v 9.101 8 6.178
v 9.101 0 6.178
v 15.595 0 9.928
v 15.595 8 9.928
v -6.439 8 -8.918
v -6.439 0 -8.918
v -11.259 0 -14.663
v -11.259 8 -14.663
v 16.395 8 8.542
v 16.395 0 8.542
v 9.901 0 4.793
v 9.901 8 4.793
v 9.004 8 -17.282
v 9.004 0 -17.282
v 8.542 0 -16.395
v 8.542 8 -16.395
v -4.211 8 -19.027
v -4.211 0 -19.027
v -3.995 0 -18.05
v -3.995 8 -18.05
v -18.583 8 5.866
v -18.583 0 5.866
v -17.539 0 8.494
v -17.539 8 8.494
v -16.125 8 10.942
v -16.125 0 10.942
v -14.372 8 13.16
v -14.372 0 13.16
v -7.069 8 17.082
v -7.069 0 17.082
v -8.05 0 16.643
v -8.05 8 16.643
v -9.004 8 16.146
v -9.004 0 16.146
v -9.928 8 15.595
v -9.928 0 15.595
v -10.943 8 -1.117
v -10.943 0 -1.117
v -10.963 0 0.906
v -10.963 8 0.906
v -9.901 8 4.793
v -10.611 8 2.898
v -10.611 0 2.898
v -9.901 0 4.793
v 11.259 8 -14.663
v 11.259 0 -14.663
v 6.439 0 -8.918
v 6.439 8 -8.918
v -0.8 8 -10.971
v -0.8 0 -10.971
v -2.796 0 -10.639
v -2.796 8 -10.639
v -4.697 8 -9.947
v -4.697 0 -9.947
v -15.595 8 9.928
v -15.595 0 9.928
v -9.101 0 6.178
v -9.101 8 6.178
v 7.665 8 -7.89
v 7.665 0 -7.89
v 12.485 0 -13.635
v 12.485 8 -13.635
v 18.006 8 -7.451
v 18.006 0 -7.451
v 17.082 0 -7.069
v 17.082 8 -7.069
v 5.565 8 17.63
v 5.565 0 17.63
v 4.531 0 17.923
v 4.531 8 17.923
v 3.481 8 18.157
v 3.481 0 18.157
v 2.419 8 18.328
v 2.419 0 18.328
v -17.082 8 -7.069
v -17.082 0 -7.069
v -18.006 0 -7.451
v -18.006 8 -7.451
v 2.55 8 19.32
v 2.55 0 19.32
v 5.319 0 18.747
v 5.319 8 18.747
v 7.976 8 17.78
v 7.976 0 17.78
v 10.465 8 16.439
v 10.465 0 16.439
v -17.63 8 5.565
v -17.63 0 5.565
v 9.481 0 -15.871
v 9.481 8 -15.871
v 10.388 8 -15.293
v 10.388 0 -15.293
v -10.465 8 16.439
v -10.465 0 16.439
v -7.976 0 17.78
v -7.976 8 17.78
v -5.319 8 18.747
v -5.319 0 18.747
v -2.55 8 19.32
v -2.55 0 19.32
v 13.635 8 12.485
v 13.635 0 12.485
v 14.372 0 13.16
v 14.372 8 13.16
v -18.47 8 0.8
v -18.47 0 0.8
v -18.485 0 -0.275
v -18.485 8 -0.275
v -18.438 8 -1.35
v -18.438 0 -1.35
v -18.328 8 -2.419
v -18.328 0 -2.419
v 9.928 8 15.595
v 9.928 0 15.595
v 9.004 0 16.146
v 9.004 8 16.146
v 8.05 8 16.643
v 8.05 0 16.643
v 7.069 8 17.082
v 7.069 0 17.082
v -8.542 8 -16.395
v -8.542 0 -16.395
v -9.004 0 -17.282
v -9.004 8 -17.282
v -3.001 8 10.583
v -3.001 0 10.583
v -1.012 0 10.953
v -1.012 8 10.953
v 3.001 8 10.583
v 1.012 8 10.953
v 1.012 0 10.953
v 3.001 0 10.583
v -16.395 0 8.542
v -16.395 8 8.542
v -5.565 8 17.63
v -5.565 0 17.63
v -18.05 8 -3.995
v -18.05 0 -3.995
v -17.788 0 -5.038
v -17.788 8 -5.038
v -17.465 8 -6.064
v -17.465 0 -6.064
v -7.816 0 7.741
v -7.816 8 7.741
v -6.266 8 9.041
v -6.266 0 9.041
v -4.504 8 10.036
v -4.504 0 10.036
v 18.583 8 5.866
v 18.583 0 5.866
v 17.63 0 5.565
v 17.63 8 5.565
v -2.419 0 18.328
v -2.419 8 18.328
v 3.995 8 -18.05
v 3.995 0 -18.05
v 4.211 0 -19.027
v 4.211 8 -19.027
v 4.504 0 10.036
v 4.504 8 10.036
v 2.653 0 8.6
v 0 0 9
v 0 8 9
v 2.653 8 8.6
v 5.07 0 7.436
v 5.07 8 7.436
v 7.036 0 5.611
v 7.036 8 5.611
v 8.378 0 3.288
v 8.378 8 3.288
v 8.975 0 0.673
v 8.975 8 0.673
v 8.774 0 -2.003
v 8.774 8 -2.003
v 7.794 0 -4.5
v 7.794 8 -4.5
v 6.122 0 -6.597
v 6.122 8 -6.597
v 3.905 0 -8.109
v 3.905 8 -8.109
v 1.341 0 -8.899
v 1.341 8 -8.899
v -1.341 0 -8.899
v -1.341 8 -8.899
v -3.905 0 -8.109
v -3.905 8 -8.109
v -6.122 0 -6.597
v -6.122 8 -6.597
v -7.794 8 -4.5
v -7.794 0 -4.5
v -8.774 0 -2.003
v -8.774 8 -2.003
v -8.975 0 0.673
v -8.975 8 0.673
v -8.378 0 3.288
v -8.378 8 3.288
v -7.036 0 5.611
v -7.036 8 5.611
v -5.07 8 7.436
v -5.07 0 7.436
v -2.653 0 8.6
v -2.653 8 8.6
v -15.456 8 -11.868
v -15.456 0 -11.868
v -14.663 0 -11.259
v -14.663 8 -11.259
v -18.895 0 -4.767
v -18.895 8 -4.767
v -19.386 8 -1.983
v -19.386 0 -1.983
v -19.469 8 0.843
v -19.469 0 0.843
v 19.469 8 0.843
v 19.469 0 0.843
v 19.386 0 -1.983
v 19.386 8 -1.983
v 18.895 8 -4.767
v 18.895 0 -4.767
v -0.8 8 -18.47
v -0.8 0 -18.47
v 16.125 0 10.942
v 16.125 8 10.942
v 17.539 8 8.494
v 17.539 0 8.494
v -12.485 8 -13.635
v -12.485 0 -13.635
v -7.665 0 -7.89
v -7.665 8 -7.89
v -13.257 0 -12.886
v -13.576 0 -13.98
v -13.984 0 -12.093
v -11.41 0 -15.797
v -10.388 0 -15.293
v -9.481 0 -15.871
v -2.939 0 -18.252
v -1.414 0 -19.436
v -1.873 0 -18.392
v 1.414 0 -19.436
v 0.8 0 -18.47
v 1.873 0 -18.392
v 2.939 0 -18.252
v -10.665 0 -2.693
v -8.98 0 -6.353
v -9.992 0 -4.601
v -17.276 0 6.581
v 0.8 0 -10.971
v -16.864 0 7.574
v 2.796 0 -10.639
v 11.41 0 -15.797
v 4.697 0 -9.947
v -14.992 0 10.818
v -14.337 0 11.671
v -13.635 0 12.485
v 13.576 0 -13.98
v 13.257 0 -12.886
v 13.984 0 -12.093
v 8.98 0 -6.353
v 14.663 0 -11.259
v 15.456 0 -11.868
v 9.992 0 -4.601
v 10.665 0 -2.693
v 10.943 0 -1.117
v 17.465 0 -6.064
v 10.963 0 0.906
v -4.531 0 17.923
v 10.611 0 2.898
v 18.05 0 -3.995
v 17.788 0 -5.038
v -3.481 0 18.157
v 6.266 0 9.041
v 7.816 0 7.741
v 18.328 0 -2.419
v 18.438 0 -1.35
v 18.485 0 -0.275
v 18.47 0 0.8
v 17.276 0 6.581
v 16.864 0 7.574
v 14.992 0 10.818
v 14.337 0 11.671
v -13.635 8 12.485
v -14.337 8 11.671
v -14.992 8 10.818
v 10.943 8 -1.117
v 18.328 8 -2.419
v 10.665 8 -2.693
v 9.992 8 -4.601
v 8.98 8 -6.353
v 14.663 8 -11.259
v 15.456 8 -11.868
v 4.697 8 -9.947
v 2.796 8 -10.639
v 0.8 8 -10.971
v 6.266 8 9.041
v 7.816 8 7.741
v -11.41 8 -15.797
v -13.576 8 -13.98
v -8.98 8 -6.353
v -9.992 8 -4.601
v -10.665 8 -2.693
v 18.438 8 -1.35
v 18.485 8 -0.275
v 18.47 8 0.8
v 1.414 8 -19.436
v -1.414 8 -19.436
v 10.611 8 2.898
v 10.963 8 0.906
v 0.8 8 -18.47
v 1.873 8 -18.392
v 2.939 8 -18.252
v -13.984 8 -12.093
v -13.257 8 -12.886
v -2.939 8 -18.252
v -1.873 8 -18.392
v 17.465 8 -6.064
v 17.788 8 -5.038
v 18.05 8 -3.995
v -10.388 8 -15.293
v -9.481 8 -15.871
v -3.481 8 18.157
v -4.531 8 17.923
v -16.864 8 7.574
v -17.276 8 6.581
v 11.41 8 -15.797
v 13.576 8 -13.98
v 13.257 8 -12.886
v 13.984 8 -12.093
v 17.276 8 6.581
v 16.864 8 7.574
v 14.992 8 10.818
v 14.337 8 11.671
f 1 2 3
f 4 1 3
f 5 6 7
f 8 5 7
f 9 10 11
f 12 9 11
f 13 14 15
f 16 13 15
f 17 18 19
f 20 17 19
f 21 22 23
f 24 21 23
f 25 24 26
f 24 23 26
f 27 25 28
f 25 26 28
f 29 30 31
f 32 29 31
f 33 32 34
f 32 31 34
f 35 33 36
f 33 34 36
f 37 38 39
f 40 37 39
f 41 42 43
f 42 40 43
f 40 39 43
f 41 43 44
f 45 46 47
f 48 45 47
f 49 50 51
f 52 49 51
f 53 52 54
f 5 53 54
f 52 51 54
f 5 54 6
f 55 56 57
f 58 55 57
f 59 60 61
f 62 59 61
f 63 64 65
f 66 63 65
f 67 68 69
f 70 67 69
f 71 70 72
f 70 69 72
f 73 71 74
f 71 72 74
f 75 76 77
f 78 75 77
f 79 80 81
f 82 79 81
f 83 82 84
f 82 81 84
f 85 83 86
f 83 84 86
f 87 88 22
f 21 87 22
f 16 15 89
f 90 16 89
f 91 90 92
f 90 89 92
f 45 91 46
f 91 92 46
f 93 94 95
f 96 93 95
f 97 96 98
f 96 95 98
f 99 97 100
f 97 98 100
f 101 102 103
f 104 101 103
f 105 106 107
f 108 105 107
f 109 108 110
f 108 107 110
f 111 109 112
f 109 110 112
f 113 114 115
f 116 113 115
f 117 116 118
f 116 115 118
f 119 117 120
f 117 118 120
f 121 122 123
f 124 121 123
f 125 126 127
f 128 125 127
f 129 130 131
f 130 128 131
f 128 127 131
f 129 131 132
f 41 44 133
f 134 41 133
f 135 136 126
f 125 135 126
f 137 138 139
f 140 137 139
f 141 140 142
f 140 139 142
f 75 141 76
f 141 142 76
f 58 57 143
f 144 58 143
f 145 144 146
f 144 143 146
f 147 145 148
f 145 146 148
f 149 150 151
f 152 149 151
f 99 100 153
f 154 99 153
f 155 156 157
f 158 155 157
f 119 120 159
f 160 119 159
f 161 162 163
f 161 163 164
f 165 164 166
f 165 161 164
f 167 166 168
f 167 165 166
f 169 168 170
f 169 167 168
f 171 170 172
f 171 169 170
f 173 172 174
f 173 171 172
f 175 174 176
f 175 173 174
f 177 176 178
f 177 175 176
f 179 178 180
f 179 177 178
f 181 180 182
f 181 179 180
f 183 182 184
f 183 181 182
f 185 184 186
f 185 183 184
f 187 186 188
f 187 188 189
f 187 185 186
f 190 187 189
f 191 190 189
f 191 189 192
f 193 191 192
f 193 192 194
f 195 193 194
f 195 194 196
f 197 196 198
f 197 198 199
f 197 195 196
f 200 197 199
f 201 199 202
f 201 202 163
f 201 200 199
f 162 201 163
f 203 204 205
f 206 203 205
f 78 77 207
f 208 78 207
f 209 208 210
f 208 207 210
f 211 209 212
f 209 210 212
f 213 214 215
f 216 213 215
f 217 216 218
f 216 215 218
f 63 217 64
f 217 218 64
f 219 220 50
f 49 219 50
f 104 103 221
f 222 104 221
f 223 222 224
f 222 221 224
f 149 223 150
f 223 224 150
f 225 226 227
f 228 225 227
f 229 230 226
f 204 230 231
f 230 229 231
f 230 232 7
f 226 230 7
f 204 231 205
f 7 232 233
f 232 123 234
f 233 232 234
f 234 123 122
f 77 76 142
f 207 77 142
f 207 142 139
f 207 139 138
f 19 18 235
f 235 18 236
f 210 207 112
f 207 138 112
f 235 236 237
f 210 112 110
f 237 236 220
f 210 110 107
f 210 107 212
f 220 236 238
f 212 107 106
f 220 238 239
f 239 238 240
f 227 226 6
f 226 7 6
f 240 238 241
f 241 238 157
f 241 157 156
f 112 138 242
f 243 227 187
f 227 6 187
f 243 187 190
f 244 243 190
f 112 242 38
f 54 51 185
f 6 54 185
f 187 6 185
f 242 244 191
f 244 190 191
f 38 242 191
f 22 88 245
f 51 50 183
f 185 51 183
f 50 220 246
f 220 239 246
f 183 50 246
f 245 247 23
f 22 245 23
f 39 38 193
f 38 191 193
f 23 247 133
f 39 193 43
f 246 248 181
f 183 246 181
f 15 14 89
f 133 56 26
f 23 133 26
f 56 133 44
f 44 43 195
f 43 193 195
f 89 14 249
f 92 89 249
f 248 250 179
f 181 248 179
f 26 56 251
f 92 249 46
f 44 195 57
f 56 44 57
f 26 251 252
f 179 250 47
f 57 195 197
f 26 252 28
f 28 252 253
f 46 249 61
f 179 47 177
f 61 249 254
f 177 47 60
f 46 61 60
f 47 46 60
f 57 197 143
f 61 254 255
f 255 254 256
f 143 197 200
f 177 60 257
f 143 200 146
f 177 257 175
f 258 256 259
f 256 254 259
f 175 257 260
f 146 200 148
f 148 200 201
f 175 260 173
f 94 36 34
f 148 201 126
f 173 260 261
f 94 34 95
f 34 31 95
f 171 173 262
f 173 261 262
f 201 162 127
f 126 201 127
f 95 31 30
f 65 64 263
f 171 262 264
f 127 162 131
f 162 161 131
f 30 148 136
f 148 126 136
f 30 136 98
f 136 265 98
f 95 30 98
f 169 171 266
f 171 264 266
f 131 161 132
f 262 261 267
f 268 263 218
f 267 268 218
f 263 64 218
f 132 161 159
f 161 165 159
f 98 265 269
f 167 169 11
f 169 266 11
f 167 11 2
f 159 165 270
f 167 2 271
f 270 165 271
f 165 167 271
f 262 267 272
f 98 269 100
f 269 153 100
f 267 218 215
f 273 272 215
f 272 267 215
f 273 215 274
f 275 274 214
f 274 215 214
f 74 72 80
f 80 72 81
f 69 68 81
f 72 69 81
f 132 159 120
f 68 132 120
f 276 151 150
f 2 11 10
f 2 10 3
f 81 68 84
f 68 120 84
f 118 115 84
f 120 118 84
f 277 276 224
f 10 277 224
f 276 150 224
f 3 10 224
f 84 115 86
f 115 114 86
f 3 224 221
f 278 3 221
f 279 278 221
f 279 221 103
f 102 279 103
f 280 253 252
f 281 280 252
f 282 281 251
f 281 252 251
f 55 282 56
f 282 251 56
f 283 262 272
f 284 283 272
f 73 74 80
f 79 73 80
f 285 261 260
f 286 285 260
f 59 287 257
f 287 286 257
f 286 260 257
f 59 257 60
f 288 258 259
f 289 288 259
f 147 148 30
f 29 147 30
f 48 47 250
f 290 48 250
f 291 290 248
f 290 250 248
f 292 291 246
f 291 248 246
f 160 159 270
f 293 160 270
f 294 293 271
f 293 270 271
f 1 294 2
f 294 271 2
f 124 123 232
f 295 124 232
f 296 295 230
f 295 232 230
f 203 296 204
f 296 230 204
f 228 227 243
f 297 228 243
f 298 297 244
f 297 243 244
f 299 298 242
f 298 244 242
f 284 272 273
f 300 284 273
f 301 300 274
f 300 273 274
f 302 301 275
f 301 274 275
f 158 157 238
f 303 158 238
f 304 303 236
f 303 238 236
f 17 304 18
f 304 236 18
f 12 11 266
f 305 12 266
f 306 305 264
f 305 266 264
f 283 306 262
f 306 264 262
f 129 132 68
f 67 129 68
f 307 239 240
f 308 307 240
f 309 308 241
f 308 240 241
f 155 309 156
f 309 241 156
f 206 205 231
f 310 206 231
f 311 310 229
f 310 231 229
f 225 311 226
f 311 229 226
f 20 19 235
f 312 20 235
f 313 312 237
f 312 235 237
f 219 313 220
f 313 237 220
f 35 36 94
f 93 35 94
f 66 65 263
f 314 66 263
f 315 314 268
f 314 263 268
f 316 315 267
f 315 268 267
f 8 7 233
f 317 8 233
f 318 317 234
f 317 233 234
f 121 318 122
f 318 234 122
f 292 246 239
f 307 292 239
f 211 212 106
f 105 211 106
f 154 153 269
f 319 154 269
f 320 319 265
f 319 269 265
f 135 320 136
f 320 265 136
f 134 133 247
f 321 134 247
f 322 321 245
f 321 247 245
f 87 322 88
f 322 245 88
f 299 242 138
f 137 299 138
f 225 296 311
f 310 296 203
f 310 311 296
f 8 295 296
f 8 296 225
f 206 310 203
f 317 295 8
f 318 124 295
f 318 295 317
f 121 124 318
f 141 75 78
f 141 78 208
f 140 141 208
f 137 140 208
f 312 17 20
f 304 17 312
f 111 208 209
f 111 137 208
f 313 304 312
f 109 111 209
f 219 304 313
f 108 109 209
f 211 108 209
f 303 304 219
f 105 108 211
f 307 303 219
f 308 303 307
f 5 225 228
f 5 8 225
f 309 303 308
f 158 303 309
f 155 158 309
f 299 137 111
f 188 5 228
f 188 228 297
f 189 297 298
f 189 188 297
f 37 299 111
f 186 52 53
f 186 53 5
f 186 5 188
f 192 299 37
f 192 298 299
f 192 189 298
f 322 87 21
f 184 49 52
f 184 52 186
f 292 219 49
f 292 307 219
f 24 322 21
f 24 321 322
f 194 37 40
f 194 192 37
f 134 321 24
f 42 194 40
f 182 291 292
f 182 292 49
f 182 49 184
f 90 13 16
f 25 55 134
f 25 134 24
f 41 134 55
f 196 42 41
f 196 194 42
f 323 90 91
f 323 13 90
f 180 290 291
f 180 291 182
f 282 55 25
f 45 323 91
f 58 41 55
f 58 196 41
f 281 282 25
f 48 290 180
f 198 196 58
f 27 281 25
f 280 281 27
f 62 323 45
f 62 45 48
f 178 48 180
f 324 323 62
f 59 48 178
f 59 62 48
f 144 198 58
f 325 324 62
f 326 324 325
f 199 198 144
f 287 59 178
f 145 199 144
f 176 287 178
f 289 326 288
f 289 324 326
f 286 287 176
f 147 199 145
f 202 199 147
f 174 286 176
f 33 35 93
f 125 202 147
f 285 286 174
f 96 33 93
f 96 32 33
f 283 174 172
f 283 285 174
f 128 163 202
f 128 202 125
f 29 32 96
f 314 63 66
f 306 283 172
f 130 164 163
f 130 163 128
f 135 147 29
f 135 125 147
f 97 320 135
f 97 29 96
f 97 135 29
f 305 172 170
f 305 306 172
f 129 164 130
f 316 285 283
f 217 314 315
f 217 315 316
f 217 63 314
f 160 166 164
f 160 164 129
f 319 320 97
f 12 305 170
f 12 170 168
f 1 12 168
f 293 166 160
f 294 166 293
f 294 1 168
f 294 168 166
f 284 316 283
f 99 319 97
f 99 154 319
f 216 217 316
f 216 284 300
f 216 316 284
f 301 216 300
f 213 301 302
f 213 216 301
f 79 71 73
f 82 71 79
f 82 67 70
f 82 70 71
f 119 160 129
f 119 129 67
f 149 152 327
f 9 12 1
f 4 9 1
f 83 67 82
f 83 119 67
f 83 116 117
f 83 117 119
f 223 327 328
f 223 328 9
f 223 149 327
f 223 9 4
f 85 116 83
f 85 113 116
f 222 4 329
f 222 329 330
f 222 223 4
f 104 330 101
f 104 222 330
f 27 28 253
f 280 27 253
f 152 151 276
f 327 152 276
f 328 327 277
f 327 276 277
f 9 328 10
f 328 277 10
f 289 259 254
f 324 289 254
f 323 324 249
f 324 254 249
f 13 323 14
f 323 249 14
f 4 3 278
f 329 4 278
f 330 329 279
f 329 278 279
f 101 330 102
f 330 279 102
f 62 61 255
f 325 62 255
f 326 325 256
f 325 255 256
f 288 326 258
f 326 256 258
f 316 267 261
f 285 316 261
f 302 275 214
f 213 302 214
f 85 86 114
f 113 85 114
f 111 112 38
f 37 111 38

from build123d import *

# Parameters (mm, degrees)
SKETCH1_R           = 11
SKETCH1_R_2         = 9
BOSS_EXTRUDE1_DEPTH = 8
BOSS_EXTRUDE4_DEPTH = 8
CIRPATTERN2_COUNT   = 9


with BuildPart() as part:
    # Sketch1 → Boss-Extrude1 (new body)
    with BuildSketch(Plane(origin=(0, 0, 0), x_dir=(1, 0, 0), z_dir=(0, 1, 0))):
        with Locations(Location((0, 0, 0), (0, 0, 270))):
            Circle(SKETCH1_R)
        with Locations(Location((0, 0, 0), (0, 0, 270))):
            Circle(SKETCH1_R_2, mode=Mode.SUBTRACT)
    extrude(amount=BOSS_EXTRUDE1_DEPTH)

    # Sketch1<3> → Boss-Extrude4 (add)
    with BuildSketch(Plane(origin=(0, 0, 0), x_dir=(1, 0, 0), z_dir=(0, 1, 0))):
        with BuildLine():
            Line((-0.8, 18.469935747), (-0.8, 10.970870522))
            ThreePointArc((-0.8, 10.970870522), (0, 11), (0.8, 10.970870522))
            Line((0.8, 10.970870522), (0.8, 18.469935747))
            ThreePointArc((0.8, 18.469935747), (2.406716727, 18.329927471), (3.995116886, 18.050417379))
            Line((3.995116886, 18.050417379), (4.211218049, 19.026788357))
            ThreePointArc((4.211218049, 19.026788357), (0, 19.487253081), (-4.211218049, 19.026788357))
            Line((-4.211218049, 19.026788357), (-3.995116886, 18.050417379))
            ThreePointArc((-3.995116886, 18.050417379), (-2.406716727, 18.329927471), (-0.8, 18.469935747))
        make_face()
    boss_extrude4 = extrude(amount=BOSS_EXTRUDE4_DEPTH)

    # CirPattern2: Boss-Extrude4 ×9 about axis
    cirpattern2_axis = Axis((0, 0, 0), (0, 1, 0))
    for i in range(1, CIRPATTERN2_COUNT):
        add(boss_extrude4.rotate(cirpattern2_axis, i * 360 / CIRPATTERN2_COUNT))


solid = part.part
